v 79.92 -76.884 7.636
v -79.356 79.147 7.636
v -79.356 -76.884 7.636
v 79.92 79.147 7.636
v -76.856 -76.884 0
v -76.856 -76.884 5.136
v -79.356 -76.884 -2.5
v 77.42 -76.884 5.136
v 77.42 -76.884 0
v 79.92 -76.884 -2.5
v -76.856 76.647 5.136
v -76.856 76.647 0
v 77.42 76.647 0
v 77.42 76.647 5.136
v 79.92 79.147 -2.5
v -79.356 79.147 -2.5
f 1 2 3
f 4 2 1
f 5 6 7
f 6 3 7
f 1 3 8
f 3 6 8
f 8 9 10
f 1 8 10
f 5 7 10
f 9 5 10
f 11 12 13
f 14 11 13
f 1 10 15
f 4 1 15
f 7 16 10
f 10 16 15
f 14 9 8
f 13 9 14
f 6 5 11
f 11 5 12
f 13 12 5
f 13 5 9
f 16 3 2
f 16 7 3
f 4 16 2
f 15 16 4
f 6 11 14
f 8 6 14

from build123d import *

# Parameters (mm, degrees)
F0_R     = 74.9064703826
F1_DEPTH = 1.778
F2_W     = 154.2756035924
F2_H     = 153.531037271
F3_DEPTH = 5.13641
F4_T     = 2.5


with BuildPart() as f1:
    # F0 (on Top) → F1 (new body)
    with BuildSketch(Plane.XY):
        Circle(F0_R)
    extrude(amount=F1_DEPTH)

    # F2 (on Top) → F3 (join)
    with BuildSketch(Plane.XY):
        with Locations((0.2817176282, -0.1181550324)):
            Rectangle(F2_W, F2_H)
    extrude(amount=F3_DEPTH)

    # F4
    f4_openings = [f1.faces().sort_by_distance(p)[0] for p in [
        (0.281718, -76.883674, 2.568205),
    ]]
    offset(amount=F4_T, openings=f4_openings, kind=Kind.INTERSECTION)


solid = f1.part
